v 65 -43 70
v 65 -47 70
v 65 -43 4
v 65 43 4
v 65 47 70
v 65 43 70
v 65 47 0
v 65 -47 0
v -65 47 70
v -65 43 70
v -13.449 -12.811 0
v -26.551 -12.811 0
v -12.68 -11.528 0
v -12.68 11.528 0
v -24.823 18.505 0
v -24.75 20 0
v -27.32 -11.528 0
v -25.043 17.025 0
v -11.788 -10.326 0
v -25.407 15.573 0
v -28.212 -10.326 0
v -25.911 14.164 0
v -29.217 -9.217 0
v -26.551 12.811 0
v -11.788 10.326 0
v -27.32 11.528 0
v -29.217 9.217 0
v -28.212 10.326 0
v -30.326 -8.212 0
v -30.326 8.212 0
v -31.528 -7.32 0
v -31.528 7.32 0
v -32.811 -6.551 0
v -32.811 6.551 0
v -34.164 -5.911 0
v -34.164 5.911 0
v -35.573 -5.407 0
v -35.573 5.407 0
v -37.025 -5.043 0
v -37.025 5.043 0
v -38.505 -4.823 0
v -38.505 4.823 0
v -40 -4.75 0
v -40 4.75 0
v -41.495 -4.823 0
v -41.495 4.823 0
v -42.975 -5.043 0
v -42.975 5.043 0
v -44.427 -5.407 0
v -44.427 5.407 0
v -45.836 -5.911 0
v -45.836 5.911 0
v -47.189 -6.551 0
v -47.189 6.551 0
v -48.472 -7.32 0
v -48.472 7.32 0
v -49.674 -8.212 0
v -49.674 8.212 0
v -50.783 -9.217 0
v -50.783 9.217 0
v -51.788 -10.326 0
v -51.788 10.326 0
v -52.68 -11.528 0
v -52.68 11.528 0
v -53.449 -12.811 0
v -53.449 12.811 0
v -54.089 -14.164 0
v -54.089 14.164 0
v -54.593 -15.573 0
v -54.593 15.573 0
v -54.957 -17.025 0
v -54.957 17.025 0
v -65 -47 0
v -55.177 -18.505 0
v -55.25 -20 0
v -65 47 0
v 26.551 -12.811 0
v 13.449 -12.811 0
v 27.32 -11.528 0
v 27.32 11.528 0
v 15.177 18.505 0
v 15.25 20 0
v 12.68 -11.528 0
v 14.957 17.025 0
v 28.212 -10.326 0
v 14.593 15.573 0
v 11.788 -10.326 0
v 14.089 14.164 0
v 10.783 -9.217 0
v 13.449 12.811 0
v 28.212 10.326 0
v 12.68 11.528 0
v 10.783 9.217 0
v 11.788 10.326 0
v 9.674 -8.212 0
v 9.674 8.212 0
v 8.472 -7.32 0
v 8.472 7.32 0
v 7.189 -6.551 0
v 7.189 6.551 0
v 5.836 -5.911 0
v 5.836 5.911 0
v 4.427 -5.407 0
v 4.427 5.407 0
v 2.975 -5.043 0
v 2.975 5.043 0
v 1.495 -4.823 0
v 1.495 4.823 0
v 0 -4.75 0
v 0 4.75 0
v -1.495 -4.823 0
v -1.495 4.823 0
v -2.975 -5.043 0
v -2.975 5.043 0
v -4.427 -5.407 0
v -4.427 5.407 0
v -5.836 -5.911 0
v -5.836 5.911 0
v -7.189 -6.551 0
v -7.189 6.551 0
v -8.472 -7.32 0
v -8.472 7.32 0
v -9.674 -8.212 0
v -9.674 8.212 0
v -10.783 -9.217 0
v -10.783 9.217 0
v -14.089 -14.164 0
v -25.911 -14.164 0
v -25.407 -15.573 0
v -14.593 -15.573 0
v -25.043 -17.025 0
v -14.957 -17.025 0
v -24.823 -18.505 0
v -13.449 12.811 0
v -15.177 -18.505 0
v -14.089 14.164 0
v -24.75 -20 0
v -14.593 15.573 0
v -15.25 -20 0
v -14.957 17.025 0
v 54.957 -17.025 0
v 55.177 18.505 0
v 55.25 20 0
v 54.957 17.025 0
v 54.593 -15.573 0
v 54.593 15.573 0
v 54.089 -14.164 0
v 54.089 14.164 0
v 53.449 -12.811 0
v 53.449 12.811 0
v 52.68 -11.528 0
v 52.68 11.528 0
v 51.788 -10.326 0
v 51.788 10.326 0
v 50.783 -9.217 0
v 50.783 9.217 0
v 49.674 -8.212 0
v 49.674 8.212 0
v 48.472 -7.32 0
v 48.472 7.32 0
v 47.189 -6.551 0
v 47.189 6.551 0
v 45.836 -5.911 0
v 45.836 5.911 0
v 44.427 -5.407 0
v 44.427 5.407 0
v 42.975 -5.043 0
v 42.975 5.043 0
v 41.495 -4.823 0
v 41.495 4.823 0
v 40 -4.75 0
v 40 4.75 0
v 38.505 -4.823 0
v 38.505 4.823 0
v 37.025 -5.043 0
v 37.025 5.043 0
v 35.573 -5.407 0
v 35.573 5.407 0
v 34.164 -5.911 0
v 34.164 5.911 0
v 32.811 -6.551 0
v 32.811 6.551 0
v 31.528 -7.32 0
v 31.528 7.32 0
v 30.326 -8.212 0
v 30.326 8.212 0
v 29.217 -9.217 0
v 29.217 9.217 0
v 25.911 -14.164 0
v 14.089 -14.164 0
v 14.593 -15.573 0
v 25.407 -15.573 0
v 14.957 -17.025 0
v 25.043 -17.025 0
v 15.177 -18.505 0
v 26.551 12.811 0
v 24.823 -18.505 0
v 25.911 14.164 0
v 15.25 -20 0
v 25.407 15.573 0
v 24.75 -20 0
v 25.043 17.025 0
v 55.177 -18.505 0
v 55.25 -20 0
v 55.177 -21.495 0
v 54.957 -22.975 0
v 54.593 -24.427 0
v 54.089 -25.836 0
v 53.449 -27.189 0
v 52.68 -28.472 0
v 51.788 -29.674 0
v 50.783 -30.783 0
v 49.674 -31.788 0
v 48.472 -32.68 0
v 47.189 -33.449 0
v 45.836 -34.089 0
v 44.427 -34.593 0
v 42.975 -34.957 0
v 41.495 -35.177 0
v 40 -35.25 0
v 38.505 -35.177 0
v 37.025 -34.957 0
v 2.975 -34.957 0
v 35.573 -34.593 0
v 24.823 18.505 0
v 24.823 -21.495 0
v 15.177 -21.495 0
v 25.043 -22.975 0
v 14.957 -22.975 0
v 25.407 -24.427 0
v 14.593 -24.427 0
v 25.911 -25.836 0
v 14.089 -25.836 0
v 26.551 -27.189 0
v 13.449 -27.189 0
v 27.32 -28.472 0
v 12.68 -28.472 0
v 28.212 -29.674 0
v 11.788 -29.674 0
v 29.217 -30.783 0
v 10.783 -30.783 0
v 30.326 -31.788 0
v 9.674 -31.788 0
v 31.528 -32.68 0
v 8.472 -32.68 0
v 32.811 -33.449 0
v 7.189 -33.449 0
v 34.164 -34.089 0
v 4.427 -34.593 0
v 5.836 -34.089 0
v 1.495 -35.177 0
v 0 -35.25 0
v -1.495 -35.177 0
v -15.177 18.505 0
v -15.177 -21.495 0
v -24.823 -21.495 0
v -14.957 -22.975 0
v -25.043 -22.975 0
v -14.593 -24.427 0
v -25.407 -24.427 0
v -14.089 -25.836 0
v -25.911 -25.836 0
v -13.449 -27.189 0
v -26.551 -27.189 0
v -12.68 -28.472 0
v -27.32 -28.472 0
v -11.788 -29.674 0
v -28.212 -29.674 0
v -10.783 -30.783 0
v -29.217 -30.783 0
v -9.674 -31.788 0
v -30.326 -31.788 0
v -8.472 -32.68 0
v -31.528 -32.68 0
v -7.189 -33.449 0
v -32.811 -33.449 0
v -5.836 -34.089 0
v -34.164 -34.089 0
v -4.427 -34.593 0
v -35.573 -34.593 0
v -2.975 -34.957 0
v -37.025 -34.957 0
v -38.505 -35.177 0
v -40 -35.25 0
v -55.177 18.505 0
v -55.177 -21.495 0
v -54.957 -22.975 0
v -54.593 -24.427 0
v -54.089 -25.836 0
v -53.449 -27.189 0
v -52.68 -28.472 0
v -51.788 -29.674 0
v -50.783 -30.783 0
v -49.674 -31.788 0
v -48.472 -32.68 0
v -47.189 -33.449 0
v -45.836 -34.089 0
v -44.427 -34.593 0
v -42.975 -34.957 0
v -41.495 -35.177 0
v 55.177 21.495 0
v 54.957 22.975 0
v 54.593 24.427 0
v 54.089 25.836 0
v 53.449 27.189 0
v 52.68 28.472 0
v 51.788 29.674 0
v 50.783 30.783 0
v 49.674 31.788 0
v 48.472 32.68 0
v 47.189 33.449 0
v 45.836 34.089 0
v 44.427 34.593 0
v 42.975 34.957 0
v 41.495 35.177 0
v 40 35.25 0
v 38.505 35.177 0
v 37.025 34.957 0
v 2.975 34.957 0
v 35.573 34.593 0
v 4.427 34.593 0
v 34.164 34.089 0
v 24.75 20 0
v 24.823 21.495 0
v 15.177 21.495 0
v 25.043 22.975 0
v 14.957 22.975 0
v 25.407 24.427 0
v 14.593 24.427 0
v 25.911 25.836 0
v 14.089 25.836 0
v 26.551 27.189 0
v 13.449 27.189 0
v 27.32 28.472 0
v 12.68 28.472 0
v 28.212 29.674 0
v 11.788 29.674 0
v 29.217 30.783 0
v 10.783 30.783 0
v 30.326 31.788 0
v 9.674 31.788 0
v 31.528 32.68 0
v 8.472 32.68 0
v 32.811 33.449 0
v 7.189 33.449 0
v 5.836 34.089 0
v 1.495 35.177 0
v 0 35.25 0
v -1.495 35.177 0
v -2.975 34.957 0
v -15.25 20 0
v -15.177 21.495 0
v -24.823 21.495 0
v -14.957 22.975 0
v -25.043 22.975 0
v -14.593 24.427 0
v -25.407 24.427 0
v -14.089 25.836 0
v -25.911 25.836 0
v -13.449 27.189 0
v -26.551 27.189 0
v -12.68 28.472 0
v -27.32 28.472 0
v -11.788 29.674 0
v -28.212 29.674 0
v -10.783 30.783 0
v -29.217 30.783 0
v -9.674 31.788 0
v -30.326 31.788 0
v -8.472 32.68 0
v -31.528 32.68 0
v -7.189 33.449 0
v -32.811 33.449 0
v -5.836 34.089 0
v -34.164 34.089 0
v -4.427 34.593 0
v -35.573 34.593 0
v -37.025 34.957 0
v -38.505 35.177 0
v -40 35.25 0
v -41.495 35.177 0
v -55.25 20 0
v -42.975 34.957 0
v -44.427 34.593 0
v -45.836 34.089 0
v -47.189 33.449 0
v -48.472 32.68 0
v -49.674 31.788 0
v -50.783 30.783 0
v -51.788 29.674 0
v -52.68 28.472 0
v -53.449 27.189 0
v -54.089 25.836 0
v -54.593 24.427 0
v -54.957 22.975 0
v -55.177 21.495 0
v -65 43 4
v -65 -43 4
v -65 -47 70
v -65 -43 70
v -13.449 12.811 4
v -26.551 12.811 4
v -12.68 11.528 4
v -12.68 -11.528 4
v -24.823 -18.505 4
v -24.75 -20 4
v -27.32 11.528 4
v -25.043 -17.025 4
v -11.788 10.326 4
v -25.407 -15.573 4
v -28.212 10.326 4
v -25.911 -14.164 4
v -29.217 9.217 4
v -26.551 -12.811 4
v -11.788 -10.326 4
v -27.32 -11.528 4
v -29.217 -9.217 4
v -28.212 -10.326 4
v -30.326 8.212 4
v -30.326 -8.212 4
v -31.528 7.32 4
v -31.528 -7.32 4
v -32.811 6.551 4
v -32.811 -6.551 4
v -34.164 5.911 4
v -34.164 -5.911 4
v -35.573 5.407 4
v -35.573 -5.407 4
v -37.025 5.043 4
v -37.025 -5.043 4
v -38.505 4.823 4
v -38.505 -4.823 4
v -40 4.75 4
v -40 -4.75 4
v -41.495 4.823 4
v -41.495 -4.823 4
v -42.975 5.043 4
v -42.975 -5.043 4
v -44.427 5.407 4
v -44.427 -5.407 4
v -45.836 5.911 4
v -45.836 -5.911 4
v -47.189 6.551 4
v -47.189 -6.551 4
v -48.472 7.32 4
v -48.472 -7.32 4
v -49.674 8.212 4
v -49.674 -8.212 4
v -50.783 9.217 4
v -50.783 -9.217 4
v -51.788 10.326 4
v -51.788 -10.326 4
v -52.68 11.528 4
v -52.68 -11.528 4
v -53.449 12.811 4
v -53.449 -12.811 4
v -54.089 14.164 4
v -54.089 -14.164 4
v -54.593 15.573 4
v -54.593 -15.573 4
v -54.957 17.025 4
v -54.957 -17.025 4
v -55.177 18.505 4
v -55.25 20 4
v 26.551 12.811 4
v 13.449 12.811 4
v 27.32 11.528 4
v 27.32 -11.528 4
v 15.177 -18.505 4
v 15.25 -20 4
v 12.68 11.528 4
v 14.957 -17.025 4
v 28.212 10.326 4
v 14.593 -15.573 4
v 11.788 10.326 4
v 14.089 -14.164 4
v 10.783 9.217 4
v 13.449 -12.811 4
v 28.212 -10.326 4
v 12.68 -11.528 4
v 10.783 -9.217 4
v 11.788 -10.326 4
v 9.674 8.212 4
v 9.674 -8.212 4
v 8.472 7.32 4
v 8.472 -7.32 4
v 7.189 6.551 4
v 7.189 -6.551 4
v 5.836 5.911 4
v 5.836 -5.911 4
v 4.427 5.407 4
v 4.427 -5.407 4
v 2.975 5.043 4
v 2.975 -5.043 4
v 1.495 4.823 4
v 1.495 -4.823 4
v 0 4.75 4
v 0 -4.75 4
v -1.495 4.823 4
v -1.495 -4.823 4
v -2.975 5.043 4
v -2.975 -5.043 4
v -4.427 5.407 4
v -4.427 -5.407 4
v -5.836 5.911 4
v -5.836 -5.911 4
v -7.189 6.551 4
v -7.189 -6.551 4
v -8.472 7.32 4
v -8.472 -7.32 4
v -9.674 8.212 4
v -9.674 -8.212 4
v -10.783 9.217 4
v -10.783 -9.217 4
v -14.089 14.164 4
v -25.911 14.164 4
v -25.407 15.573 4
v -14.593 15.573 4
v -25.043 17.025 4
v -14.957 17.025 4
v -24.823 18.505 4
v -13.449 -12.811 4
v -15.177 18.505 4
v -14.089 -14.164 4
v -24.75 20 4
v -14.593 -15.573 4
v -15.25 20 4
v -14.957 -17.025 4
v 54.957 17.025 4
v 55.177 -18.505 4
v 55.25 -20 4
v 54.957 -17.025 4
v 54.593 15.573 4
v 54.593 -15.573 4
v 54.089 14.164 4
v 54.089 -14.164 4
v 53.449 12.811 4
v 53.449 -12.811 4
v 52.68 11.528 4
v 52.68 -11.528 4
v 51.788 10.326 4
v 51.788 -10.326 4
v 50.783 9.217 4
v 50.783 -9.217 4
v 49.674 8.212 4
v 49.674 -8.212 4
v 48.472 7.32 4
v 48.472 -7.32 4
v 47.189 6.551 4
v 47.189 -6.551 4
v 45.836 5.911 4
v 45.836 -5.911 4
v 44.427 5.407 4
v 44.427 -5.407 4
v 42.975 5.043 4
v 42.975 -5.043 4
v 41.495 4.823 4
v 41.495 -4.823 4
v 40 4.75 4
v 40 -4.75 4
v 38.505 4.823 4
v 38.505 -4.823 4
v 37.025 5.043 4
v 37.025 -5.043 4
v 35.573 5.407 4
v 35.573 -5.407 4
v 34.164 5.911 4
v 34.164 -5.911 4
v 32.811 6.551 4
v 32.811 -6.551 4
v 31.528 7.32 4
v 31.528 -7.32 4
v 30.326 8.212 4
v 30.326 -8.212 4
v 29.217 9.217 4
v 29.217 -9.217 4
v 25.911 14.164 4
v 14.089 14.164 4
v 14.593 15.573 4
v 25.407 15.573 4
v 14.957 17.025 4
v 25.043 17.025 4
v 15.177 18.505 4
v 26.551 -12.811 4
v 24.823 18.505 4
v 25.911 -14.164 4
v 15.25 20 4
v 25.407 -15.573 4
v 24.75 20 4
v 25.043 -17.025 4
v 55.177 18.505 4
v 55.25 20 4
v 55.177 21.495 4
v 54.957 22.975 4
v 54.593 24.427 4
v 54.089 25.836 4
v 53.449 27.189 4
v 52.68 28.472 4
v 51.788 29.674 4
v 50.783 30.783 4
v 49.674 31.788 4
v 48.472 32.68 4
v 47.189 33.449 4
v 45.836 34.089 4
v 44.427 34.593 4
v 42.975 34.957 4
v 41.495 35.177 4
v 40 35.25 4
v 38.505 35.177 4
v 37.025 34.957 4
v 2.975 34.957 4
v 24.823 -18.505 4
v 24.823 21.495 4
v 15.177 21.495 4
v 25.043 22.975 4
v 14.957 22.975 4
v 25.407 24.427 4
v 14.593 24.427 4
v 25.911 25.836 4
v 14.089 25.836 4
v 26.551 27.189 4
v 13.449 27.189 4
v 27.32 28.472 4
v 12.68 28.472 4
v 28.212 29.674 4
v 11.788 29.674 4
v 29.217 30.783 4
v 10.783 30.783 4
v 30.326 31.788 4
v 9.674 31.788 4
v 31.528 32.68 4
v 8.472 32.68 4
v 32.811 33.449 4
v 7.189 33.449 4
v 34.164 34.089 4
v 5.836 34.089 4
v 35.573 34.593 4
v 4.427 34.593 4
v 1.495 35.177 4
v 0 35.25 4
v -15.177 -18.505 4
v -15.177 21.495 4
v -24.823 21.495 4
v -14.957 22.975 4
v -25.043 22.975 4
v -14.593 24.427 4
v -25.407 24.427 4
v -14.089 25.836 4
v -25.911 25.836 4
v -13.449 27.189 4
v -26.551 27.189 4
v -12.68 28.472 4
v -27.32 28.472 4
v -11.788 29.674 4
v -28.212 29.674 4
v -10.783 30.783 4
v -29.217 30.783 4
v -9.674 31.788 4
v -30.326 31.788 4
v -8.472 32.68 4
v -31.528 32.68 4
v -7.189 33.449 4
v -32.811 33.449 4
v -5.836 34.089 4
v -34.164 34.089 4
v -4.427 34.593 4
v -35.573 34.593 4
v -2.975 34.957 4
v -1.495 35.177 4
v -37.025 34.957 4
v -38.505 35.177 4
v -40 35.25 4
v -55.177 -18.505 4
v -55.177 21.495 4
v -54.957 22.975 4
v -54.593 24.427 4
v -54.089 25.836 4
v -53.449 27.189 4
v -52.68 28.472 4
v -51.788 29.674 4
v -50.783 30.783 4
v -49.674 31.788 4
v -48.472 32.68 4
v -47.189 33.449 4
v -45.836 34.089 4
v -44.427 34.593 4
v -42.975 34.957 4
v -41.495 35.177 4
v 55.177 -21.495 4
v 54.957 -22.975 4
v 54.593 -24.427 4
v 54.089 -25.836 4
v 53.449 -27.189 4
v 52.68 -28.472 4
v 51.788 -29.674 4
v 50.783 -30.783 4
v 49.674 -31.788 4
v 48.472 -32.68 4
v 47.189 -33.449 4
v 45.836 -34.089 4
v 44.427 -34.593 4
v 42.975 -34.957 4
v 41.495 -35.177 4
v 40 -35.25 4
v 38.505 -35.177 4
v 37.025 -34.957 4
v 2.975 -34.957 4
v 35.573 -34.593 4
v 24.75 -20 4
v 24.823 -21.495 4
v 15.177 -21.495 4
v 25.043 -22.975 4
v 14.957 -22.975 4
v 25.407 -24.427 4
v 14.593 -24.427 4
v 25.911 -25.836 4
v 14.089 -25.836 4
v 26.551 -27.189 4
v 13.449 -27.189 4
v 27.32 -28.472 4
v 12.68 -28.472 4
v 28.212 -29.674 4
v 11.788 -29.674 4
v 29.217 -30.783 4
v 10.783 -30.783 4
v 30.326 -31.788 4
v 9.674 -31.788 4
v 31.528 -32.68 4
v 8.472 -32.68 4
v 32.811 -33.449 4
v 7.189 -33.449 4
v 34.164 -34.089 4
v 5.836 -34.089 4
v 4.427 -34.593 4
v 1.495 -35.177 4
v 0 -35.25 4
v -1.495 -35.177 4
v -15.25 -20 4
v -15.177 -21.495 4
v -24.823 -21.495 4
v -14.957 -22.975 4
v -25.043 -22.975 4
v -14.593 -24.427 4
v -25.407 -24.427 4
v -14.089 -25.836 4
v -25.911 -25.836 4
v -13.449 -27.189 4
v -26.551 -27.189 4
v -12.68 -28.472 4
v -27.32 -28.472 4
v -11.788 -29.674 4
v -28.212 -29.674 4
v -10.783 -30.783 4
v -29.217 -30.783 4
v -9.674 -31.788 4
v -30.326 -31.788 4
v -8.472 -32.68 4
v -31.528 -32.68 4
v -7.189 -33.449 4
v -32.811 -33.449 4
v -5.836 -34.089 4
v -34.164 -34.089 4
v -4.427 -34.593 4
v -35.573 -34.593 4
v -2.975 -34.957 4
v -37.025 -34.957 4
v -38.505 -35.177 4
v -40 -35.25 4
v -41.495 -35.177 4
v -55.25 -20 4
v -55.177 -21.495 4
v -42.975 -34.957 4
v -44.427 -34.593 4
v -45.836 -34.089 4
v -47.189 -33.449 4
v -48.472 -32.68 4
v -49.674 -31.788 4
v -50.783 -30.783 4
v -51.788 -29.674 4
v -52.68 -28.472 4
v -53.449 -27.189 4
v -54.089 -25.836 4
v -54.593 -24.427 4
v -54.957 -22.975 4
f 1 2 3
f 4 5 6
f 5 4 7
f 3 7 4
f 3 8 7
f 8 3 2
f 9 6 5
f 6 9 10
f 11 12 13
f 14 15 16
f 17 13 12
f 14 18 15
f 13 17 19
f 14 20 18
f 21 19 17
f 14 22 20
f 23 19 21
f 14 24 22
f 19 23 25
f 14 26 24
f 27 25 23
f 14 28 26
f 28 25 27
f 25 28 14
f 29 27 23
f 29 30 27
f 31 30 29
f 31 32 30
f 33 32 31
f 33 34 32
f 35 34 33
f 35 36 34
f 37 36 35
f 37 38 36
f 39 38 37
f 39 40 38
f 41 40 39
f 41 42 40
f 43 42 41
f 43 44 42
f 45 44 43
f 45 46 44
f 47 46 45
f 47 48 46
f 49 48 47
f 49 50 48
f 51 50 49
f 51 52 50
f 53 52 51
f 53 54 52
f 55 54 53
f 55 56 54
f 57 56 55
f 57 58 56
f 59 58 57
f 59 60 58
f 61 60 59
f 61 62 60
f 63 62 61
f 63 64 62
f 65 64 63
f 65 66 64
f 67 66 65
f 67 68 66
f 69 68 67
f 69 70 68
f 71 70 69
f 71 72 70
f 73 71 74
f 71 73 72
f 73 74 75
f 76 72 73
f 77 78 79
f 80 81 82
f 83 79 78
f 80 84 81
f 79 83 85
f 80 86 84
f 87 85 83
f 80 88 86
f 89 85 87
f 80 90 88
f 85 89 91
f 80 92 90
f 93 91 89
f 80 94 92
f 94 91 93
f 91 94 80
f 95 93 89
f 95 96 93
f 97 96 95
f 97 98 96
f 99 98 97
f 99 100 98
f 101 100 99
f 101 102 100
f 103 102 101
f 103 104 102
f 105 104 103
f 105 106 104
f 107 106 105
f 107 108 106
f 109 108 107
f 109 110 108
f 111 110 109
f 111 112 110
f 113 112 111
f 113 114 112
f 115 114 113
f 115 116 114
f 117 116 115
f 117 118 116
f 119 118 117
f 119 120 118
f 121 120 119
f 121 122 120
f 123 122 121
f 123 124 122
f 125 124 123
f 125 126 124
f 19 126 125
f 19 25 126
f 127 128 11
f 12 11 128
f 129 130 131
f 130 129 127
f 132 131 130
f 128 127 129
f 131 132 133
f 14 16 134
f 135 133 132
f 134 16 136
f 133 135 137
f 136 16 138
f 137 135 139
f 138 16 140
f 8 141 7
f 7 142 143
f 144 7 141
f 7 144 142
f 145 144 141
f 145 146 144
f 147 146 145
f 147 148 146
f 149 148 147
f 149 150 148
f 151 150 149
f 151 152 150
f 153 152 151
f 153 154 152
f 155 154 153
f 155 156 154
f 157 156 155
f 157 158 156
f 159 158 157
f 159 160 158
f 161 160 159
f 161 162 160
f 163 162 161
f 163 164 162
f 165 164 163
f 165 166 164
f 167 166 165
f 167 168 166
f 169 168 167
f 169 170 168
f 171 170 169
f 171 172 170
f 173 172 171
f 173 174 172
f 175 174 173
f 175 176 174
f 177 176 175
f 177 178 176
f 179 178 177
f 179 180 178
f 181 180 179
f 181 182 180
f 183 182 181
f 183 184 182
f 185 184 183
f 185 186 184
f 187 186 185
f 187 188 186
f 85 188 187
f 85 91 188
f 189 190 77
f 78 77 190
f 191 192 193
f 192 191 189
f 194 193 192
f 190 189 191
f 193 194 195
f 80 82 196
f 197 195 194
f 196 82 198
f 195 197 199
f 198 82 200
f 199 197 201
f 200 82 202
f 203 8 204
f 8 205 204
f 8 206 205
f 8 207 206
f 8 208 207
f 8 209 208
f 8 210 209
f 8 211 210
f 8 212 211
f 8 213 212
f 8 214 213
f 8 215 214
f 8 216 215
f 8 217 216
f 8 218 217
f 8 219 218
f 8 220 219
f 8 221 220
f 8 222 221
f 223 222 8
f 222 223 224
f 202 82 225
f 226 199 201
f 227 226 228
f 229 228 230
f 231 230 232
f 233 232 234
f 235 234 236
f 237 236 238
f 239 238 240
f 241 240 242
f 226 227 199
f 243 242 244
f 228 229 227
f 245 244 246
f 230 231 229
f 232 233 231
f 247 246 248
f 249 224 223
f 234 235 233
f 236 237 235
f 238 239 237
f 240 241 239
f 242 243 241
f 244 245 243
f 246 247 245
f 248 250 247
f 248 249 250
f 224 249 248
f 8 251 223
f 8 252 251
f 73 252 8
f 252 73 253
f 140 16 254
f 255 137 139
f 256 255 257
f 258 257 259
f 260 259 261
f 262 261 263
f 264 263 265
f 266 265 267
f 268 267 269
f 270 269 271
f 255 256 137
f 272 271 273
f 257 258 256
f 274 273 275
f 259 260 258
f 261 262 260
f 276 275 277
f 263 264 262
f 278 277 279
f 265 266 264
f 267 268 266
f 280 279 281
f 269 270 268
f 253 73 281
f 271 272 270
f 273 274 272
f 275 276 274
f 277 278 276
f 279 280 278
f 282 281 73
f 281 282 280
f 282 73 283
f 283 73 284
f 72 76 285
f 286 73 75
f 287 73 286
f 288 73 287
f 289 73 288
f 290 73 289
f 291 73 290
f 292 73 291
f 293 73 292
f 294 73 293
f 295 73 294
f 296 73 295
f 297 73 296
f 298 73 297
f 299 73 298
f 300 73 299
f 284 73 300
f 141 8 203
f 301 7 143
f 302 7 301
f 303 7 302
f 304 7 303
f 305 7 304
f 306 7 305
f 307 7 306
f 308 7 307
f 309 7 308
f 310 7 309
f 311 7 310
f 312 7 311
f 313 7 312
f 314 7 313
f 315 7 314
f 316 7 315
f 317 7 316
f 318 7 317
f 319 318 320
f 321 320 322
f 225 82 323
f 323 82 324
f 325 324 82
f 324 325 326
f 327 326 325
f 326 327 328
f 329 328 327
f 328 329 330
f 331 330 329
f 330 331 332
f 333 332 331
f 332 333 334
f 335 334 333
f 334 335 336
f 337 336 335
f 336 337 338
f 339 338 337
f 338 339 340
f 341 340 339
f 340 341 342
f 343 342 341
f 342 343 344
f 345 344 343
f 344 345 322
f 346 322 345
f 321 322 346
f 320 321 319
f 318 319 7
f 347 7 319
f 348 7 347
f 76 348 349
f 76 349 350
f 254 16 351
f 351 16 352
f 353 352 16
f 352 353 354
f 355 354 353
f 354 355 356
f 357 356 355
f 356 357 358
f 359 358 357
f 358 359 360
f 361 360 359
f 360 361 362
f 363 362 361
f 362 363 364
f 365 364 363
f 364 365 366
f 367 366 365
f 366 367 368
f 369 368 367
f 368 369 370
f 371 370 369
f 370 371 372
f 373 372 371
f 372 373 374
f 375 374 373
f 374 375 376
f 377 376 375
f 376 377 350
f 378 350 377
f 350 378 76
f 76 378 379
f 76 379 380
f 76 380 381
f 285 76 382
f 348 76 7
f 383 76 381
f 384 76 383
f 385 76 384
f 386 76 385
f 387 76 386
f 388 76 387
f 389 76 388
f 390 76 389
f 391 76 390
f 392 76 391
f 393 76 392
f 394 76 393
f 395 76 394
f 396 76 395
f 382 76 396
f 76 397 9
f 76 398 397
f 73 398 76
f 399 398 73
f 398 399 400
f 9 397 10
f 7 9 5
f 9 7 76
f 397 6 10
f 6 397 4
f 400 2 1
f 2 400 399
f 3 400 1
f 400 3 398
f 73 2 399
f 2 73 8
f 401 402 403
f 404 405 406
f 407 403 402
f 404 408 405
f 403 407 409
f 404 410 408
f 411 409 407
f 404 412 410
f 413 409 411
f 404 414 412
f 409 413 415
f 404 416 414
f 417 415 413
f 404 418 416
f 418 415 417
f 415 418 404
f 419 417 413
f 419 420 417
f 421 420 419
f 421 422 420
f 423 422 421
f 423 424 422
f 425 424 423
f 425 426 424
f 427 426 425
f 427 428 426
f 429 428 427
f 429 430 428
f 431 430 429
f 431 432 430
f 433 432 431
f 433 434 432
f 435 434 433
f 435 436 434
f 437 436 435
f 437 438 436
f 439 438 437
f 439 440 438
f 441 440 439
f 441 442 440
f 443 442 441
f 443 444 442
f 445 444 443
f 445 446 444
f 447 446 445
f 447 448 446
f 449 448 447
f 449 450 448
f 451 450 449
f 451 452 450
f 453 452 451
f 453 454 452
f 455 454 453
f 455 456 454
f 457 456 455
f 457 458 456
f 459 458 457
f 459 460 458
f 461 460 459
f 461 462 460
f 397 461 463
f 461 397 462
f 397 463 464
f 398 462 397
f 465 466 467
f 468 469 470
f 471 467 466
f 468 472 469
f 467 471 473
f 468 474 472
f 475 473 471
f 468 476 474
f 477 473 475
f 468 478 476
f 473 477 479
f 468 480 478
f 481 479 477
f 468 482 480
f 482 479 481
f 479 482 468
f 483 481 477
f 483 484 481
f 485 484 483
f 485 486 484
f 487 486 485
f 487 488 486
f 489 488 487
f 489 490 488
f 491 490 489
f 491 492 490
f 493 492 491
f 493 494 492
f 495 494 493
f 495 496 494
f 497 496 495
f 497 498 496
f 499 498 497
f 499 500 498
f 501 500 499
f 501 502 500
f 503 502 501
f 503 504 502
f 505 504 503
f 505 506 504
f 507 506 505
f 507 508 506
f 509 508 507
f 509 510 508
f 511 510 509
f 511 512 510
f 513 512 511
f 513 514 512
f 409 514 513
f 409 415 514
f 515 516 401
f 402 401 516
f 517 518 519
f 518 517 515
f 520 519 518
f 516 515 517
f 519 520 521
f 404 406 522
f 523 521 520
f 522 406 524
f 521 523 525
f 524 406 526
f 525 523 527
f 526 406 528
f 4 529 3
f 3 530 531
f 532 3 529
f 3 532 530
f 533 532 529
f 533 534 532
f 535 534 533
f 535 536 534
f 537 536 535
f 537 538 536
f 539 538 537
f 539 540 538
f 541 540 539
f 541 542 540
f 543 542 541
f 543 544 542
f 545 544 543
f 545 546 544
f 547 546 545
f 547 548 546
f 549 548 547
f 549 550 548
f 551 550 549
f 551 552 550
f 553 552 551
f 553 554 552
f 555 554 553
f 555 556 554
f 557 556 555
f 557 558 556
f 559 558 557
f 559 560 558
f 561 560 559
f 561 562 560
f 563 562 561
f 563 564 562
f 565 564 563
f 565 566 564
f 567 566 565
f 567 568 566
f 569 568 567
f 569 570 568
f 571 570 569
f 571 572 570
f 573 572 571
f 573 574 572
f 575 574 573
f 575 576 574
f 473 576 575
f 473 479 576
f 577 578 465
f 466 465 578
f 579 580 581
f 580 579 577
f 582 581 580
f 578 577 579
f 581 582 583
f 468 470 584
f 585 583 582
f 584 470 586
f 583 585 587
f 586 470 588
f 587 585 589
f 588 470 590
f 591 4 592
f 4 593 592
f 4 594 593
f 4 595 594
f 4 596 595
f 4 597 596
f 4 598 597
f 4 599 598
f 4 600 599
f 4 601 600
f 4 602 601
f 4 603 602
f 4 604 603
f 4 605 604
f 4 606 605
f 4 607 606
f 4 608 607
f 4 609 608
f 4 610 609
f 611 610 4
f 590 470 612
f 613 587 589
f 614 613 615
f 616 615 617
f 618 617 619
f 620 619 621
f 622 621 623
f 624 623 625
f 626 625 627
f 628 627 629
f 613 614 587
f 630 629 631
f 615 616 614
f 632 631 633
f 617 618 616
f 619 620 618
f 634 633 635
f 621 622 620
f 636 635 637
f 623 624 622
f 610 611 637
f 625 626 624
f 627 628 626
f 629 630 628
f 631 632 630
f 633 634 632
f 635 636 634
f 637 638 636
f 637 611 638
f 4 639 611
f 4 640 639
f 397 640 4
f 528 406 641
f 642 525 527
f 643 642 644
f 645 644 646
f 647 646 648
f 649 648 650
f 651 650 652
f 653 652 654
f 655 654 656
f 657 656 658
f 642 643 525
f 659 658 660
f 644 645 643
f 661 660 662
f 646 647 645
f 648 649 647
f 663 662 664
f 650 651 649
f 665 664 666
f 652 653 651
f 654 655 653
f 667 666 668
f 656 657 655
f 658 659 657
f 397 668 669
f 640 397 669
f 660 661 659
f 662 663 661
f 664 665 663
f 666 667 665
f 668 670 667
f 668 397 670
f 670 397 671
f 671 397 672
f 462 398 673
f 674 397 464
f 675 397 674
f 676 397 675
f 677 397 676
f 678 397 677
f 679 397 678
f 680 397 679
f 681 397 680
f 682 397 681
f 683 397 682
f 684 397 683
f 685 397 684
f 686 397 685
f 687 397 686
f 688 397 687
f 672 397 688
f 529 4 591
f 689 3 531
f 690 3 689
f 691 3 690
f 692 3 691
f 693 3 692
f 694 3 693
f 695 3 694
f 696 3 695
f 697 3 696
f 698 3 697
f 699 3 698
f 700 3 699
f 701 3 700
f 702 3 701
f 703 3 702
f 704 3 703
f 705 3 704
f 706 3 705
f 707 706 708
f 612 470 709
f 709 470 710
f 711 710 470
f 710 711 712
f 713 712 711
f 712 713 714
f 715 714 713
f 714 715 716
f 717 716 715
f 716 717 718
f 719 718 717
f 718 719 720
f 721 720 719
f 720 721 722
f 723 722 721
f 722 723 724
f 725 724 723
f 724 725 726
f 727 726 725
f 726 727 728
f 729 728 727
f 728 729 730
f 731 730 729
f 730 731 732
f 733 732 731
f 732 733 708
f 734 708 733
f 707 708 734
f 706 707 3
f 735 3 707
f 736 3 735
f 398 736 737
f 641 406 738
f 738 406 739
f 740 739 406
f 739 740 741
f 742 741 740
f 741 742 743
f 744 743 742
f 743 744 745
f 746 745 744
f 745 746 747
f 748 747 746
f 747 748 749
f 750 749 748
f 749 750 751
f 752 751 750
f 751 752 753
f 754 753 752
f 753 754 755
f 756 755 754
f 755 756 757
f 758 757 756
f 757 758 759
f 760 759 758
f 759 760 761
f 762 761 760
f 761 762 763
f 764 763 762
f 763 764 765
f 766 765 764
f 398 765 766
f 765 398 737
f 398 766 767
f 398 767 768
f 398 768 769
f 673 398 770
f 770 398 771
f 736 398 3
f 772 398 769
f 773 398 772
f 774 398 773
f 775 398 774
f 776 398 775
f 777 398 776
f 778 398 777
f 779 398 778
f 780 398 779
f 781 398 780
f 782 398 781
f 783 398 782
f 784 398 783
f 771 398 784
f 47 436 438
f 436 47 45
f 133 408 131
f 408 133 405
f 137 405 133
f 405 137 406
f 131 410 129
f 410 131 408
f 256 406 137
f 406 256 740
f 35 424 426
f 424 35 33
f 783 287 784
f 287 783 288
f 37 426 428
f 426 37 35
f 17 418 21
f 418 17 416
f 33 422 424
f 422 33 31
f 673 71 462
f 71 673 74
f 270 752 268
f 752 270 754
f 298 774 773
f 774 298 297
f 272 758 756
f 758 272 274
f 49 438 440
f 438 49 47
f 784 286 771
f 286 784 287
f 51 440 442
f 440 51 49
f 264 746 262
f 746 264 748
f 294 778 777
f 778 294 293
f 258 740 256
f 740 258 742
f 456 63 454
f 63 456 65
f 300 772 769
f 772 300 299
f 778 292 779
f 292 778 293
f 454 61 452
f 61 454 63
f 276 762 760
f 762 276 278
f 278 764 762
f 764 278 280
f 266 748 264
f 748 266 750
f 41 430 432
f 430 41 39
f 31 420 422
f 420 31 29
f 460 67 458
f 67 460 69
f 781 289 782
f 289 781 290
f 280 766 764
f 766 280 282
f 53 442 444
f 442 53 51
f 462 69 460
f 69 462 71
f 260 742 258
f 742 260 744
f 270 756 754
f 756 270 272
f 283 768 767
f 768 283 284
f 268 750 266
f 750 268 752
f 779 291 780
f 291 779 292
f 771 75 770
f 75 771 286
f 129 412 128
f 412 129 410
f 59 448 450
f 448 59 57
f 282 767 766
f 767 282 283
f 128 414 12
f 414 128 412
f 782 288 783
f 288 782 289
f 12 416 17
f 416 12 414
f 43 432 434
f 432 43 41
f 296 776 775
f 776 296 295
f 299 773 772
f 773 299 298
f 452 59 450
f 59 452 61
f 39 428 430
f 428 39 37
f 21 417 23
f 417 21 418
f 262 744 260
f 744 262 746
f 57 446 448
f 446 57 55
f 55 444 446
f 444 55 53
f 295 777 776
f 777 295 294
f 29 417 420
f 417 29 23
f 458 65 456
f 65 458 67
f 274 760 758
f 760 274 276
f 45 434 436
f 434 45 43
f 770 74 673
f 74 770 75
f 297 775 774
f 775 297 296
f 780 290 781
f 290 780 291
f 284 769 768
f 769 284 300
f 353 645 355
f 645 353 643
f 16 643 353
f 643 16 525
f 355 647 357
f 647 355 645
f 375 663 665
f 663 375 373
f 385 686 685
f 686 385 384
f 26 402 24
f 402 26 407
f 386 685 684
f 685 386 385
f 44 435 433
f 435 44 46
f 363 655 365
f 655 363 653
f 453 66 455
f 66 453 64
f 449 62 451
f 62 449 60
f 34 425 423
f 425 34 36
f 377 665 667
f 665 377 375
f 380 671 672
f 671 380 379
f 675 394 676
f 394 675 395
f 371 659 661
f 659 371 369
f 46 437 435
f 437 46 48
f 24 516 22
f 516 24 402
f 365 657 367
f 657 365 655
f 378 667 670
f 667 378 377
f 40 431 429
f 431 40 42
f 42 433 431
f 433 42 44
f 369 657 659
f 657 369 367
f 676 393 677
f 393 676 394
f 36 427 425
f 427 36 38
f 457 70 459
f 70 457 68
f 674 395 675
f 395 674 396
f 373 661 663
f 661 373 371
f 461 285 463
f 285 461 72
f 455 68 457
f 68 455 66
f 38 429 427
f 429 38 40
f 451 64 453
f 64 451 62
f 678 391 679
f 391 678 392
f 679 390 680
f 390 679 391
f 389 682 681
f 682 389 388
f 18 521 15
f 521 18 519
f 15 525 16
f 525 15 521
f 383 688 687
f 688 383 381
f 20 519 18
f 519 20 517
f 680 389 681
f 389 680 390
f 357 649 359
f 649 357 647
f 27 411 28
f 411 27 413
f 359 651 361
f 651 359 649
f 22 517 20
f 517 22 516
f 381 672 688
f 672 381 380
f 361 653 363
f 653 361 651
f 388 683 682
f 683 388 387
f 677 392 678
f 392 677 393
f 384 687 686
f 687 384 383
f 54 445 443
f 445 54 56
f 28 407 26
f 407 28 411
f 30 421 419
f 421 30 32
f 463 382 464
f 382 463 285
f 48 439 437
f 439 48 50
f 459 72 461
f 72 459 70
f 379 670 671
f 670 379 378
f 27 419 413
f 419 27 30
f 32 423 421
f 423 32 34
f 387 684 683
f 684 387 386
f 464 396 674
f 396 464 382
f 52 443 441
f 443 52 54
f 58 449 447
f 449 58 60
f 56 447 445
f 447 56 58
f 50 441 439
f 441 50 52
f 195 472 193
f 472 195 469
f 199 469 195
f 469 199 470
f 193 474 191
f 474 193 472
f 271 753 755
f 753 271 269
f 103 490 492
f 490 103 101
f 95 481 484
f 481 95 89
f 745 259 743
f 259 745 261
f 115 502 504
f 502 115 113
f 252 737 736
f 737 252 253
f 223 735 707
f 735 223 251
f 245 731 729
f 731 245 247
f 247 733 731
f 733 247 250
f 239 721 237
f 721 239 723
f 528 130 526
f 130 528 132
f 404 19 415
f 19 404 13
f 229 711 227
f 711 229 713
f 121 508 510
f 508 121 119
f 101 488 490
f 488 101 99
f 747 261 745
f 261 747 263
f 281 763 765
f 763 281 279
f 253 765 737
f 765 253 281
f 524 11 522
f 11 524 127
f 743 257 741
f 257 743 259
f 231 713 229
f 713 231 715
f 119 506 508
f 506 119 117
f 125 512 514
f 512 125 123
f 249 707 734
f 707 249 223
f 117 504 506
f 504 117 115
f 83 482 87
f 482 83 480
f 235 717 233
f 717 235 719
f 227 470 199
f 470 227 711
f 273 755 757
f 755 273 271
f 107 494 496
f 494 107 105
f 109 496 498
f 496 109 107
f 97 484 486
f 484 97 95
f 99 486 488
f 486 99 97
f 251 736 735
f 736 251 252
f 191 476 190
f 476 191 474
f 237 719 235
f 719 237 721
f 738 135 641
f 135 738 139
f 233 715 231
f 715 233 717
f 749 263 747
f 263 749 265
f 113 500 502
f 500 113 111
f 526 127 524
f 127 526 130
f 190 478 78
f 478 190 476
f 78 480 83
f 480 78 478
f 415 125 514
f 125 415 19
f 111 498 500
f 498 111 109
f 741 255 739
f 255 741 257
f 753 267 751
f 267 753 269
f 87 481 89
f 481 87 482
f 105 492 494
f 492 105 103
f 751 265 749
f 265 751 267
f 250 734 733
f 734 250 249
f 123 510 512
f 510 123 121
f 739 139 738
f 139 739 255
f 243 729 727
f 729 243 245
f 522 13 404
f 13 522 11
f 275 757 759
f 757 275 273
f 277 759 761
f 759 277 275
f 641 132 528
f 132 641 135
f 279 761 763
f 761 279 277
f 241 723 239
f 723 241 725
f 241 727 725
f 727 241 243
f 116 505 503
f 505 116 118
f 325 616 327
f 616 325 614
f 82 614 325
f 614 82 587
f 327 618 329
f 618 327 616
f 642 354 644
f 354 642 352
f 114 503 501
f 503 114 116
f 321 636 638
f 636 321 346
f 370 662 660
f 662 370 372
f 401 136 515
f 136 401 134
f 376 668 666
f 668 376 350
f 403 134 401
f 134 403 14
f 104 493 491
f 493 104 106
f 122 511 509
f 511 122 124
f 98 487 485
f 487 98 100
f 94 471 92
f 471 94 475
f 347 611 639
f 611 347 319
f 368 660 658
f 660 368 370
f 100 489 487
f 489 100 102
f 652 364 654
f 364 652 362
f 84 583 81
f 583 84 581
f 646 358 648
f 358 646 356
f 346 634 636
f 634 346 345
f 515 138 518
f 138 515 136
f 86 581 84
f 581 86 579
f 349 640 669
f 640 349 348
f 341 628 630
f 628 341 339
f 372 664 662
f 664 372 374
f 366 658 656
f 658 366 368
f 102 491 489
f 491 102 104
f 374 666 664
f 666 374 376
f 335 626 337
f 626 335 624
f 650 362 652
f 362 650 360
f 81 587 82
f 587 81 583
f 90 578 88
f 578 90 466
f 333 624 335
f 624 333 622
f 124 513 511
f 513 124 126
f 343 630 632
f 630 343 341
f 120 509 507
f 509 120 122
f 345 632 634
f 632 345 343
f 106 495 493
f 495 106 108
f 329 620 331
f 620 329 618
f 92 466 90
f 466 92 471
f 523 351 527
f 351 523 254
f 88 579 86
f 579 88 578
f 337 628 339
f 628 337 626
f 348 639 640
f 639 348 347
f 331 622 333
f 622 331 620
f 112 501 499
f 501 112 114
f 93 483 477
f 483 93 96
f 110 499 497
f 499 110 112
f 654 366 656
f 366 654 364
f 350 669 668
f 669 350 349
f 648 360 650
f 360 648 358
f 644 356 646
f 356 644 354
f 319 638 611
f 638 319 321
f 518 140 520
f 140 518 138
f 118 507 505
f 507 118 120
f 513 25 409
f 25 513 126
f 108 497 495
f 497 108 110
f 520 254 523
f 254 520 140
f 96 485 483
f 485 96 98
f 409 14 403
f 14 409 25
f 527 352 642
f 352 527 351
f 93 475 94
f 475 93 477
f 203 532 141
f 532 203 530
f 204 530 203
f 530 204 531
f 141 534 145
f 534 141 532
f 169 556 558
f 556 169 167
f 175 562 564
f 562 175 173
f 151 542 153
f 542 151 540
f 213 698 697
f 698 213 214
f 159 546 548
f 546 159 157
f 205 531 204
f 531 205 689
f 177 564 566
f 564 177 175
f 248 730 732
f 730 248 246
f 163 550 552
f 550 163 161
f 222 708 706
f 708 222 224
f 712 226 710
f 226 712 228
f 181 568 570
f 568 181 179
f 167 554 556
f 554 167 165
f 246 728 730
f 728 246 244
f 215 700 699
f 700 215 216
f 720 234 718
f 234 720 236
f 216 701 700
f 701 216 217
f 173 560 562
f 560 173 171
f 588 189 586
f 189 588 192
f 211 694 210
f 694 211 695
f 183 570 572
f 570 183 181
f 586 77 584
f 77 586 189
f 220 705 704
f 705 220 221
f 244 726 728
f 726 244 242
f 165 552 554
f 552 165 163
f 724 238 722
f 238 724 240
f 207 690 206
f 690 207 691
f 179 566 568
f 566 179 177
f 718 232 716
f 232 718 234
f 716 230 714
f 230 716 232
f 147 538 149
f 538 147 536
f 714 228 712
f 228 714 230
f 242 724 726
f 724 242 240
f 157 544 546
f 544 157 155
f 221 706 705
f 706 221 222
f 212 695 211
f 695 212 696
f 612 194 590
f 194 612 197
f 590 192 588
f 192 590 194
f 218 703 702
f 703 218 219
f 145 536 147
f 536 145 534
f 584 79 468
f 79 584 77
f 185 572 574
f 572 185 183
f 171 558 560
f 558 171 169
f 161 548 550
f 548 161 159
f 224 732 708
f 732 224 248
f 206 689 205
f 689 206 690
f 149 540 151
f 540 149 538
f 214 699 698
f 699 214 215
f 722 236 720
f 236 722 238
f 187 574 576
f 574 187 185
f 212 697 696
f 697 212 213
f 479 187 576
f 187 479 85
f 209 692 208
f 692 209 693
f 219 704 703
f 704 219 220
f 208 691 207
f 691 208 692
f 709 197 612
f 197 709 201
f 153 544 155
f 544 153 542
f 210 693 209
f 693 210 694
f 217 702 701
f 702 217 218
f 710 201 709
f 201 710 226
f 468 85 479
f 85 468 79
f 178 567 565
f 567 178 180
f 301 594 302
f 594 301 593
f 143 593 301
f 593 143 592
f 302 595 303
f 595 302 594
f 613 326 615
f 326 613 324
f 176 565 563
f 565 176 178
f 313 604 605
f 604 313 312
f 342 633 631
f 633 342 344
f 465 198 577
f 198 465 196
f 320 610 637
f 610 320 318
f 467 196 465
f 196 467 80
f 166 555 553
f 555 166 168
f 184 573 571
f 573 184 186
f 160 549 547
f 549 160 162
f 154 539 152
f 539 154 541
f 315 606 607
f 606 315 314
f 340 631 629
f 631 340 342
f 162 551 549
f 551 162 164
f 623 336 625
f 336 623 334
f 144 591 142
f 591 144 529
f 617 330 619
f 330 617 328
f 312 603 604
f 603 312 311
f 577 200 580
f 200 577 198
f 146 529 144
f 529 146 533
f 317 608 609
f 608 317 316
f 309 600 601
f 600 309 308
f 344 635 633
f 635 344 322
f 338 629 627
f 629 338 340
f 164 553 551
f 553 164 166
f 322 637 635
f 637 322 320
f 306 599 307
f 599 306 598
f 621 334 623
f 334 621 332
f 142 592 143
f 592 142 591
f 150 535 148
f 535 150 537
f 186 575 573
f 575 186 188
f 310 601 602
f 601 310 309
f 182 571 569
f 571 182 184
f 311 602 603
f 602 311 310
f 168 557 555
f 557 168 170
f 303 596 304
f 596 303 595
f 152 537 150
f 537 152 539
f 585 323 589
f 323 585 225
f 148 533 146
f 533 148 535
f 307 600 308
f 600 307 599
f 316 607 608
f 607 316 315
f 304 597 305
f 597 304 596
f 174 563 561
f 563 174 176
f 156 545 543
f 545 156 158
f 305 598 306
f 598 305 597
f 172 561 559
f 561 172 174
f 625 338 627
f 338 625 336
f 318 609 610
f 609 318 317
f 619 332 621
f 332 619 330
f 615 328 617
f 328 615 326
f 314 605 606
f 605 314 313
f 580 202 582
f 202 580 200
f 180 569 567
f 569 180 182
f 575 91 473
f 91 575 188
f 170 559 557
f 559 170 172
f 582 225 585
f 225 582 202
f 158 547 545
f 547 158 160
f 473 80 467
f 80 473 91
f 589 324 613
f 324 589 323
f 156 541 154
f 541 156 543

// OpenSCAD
// Rack for six 50 mL conical (Falcon-type) tubes
// Printed upside down and flipped over after printing

$fn = 64;

// Plate dimensions
plate_x = 130; // mm, X direction
plate_y = 90;  // mm, Y direction
plate_z = 4;   // mm, thickness

// Hole pattern
hole_diameter = 30.5; // mm
hole_spacing_x = 40;  // mm, centre-to-centre in X
hole_spacing_y = 40;  // mm, centre-to-centre in Y
hole_rows = 2;        // number of rows (along Y)
hole_cols = 3;        // number of columns (along X)

// Compute hole positions (centred on plate)
hole_x_offset = (plate_x - (hole_cols - 1) * hole_spacing_x) / 2;
hole_y_offset = (plate_y - (hole_rows - 1) * hole_spacing_y) / 2;

// Walls along long edges (X direction)
// Walls are flush with plate's long edges (at Y = ±plate_y/2)
// Each wall is 4 mm thick, so centered at Y = ±plate_y/2
wall_thickness = 4;   // mm
wall_height = 70;     // mm

// Plate base
module plate_base() {
    translate([0, 0, plate_z/2]) {
        cube([plate_x, plate_y, plate_z], center=true);
    }
}

// Holes for tubes
module hole_grid() {
    for (i = [0 : hole_cols - 1]) {
        for (j = [0 : hole_rows - 1]) {
            x = -plate_x/2 + hole_x_offset + i * hole_spacing_x;
            y = -plate_y/2 + hole_y_offset + j * hole_spacing_y;
            translate([x, y, -1]) {
                cylinder(h = plate_z + 2, r = hole_diameter/2, center=false);
            }
        }
    }
}

// Walls along long edges (X direction)
module walls() {
    // Front wall (positive Y edge) - centered at Y = plate_y/2
    translate([0, plate_y/2, wall_height/2]) {
        cube([plate_x, wall_thickness, wall_height], center=true);
    }
    
    // Back wall (negative Y edge) - centered at Y = -plate_y/2
    translate([0, -plate_y/2, wall_height/2]) {
        cube([plate_x, wall_thickness, wall_height], center=true);
    }
}

// Combine all parts
module rack() {
    difference() {
        union() {
            plate_base();
            walls();
        }
        hole_grid();
    }
}

rack();
